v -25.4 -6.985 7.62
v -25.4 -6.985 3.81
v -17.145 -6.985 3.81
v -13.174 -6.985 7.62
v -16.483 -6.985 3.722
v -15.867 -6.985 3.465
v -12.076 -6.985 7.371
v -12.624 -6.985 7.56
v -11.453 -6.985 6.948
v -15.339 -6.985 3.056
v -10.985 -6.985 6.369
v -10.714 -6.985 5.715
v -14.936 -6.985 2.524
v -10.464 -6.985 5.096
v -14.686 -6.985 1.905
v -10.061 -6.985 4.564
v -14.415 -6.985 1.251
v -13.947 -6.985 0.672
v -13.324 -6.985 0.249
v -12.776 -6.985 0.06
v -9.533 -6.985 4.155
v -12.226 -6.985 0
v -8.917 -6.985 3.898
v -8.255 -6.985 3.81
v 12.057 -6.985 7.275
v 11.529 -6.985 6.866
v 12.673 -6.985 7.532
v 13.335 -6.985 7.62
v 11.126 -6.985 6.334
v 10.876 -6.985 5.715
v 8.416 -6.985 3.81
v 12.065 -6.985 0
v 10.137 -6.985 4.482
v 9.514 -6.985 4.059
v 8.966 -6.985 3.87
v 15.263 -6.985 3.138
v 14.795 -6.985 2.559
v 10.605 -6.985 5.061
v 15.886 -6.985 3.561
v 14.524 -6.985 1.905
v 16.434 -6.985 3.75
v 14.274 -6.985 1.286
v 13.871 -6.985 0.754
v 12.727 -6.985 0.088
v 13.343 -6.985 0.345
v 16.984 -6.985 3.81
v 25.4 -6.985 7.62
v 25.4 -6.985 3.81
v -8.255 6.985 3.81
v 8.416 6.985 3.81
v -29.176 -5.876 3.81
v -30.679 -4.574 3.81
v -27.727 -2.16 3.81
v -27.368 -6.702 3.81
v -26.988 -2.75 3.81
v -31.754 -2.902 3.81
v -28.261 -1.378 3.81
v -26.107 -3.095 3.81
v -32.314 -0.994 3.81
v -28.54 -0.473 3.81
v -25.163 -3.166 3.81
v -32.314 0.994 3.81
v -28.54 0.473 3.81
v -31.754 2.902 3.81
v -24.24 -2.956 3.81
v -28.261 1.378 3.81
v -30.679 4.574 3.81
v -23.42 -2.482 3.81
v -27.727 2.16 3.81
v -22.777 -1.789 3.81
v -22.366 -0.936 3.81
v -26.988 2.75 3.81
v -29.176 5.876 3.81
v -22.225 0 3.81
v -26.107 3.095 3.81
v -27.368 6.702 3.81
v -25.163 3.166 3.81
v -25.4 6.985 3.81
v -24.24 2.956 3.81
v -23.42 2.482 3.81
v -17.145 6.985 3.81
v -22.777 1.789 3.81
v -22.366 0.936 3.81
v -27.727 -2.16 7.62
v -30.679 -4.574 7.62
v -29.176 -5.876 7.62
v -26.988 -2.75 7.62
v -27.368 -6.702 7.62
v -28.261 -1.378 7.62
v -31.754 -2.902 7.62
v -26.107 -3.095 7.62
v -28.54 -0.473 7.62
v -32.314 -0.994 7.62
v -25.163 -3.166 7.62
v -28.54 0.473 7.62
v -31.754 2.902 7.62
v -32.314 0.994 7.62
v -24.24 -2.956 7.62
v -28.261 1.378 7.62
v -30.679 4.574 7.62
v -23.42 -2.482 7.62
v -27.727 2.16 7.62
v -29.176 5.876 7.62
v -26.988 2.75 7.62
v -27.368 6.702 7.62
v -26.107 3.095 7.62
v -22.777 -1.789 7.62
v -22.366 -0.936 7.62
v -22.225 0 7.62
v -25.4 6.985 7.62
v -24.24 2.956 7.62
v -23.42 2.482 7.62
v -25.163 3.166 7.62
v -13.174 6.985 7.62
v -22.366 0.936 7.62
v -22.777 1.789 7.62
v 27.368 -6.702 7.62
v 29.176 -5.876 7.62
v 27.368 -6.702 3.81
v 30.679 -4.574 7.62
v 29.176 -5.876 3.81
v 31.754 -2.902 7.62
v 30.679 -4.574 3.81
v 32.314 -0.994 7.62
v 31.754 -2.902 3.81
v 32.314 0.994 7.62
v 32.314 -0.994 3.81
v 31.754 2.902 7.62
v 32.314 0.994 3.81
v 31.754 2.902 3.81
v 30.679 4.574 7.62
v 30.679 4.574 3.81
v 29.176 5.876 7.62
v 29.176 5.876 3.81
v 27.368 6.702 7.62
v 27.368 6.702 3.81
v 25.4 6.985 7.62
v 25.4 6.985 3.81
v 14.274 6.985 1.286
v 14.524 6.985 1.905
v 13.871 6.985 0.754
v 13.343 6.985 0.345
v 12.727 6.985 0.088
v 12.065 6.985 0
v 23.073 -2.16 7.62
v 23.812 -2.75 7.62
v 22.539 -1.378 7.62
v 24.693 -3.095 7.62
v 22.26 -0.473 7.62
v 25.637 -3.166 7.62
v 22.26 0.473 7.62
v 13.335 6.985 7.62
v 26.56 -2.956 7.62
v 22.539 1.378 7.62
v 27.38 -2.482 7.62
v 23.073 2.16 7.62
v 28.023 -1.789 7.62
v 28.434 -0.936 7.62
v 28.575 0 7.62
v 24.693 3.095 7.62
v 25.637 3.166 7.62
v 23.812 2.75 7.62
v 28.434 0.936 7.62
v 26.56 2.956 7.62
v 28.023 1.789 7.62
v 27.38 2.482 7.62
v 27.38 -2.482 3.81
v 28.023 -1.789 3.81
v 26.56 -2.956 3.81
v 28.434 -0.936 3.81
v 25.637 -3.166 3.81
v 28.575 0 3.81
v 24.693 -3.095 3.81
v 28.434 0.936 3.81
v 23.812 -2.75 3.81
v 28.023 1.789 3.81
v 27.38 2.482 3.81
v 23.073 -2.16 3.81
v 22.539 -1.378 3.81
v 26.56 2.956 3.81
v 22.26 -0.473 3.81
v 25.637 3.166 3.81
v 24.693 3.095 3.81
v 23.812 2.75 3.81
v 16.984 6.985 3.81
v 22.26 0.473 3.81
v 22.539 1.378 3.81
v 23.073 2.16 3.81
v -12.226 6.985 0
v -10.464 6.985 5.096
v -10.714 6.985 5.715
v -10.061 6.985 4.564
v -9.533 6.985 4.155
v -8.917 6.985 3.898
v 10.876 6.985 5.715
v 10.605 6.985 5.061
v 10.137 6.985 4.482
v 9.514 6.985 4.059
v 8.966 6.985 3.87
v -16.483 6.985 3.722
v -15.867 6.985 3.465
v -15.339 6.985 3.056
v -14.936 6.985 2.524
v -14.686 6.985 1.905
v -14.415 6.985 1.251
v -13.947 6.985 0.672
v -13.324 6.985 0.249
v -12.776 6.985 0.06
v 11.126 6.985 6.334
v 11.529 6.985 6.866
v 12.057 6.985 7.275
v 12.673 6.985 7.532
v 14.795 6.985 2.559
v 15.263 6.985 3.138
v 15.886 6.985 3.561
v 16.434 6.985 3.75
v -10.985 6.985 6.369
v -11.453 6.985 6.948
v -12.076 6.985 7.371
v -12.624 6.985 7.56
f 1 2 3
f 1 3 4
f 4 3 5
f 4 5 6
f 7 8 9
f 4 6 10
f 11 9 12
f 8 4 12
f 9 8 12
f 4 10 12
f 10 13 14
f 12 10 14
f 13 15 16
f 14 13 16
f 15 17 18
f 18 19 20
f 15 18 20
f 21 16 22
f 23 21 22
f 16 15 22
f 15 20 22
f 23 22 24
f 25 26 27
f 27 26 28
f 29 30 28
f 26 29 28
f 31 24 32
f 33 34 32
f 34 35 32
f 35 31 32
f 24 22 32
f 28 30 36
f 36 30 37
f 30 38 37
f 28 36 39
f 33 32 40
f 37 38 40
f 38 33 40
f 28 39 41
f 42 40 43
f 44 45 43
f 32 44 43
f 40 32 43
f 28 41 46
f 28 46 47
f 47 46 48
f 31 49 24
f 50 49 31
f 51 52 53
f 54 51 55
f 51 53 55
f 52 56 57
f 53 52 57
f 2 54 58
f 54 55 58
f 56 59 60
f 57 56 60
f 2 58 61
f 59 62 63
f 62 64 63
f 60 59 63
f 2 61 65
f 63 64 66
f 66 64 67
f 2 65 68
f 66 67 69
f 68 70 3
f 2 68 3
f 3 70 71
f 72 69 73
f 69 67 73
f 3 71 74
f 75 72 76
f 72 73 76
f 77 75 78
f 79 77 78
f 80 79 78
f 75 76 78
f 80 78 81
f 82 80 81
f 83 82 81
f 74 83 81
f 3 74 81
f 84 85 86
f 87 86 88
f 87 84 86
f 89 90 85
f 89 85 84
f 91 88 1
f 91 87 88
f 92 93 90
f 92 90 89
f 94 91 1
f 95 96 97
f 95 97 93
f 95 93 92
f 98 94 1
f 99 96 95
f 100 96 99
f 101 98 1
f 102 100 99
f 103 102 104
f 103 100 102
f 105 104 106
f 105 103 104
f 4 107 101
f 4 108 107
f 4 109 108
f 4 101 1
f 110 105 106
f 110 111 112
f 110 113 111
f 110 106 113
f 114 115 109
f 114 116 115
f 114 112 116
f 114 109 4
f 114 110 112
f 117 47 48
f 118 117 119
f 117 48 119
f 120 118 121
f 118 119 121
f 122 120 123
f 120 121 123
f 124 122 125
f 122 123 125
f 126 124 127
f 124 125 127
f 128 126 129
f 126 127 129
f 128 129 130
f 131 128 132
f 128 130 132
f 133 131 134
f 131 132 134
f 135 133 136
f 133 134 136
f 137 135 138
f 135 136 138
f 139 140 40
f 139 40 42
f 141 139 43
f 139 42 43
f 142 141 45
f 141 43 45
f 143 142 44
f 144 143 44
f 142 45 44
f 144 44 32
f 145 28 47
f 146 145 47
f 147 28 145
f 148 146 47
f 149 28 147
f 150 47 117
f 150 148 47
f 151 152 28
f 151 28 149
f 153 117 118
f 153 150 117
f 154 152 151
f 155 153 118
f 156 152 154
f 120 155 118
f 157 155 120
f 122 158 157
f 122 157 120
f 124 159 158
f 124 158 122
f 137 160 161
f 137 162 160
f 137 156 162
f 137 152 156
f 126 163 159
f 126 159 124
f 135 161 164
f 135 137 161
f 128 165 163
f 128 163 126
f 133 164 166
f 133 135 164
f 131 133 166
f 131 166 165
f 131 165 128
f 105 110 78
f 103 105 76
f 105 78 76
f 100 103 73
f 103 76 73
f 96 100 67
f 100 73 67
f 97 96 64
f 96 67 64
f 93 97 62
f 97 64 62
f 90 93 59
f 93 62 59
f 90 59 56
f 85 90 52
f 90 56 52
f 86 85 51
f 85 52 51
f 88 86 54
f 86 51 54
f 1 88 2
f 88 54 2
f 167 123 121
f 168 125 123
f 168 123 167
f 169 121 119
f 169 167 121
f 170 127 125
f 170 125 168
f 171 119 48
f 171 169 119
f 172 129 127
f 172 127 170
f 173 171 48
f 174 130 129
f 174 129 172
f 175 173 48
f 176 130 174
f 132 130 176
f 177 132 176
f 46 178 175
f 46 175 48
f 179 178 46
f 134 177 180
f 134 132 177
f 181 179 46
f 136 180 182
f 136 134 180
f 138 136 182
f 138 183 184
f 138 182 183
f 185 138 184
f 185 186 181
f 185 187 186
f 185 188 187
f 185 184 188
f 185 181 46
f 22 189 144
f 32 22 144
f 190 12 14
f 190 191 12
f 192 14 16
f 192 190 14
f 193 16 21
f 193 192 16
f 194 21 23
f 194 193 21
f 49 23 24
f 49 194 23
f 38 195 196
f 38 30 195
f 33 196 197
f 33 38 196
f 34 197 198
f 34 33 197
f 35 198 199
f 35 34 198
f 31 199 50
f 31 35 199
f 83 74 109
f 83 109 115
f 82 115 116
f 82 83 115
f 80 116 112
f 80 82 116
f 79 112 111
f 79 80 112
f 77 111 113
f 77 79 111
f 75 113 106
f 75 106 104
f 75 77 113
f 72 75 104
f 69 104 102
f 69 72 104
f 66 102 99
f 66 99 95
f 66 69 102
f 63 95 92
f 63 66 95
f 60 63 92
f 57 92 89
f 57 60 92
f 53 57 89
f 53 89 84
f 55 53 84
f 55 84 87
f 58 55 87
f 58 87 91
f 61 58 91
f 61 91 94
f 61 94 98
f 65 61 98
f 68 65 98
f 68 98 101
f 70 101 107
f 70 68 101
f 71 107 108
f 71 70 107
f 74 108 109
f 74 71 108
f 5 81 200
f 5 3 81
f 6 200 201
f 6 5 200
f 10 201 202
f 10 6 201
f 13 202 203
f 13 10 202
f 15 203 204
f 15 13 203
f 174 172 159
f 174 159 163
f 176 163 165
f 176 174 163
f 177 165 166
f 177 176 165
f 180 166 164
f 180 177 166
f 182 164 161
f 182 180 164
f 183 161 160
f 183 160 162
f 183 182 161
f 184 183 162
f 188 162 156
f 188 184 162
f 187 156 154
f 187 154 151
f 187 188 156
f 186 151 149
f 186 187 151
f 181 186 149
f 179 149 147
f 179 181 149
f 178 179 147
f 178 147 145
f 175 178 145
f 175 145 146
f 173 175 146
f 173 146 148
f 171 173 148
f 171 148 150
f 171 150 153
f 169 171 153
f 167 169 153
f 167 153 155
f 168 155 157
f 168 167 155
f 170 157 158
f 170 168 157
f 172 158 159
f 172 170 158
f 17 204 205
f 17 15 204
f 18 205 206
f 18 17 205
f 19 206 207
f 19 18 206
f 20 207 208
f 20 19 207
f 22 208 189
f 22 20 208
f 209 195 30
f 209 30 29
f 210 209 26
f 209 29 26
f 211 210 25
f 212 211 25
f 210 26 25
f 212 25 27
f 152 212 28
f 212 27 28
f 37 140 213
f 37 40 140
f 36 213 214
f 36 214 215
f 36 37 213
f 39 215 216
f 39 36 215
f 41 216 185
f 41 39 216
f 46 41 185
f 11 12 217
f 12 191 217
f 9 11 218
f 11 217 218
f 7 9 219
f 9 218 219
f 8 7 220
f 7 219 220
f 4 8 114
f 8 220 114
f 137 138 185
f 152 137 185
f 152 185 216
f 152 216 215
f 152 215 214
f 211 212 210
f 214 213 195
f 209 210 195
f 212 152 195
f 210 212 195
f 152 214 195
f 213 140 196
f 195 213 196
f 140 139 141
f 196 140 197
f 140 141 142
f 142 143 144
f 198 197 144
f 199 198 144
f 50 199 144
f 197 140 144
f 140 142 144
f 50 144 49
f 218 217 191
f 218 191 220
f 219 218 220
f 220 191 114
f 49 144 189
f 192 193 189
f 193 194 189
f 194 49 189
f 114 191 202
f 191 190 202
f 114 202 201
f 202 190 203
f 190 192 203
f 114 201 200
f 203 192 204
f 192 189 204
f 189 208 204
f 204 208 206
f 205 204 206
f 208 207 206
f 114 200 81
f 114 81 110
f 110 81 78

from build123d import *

# Parameters (mm, degrees)
F0_R      = 3.175
F1_DEPTH  = 3.81
F2_R      = 3.175
F3_DEPTH  = 3.81
F4_W      = 35.3329224761
F4_H      = 3.81
F4_W_2    = 10.795
F5_DEPTH  = 38.1
F6_R      = 2.54
F7_R      = 2.54
F8_R      = 3.175
F9_DEPTH  = 3.81
F10_W     = 19.05
F10_H     = 3.81
F11_DEPTH = 38.1
F12_R     = 2.54
F13_R     = 2.54


with BuildPart() as f1:
    # F0 (on Top) → F1 (new body)
    with BuildSketch(Plane.XY):
        with BuildLine():
            ThreePointArc((25.4, -6.985), (32.385, 0), (25.4, 6.985))
            Line((25.4, 6.985), (-25.4, 6.985))
            ThreePointArc((-25.4, 6.985), (-32.385, 0), (-25.4, -6.985))
            Line((-25.4, -6.985), (25.4, -6.985))
        make_face()
        with Locations((-25.4, 0)):
            Circle(F0_R, mode=Mode.SUBTRACT)
        with Locations((25.4, 0)):
            Circle(F0_R, mode=Mode.SUBTRACT)
    extrude(amount=F1_DEPTH)

    # F2 (on face) → F3 (join)
    with BuildSketch(Plane.XY.offset(3.81)):
        with BuildLine():
            Line((-10.795, -6.985), (-10.795, 6.985))
            Line((-10.795, 6.985), (-25.4, 6.985))
            ThreePointArc((-25.4, 6.985), (-32.385, 0), (-25.4, -6.985))
            Line((-25.4, -6.985), (-10.795, -6.985))
        make_face()
        with Locations((-25.4, 0)):
            Circle(F2_R, mode=Mode.SUBTRACT)
    extrude(amount=F3_DEPTH)

    # F4 (on face) → F5 (cut)
    with BuildSketch(Plane(origin=(0, 6.985, 0), x_dir=(-1, 0, 0), z_dir=(0, 1, 0))):
        with Locations((43.066461238, 1.905)):
            Rectangle(F4_W, F4_H)
        with Locations((20.0025, 1.905)):
            Rectangle(F4_W_2, F4_H)
    extrude(amount=-F5_DEPTH, mode=Mode.SUBTRACT)

    # F6
    f6_edges = [f1.edges().sort_by_distance(p)[0] for p in [
        (-10.795, 0, 3.81),
        (-14.605, 0, 3.81),
    ]]
    fillet(f6_edges, radius=F6_R)

    # F7
    f7_edges = [f1.edges().sort_by_distance(p)[0] for p in [
        (-10.795, 0, 7.62),
        (-14.605, 0, 0),
    ]]
    fillet(f7_edges, radius=F7_R)

    # F8 (on face) → F9 (join)
    with BuildSketch(Plane.XY.offset(3.81)):
        with BuildLine():
            Line((25.4, 6.985), (10.795, 6.985))
            Line((10.795, 6.985), (10.795, -6.985))
            Line((10.795, -6.985), (25.4, -6.985))
            ThreePointArc((25.4, -6.985), (32.385, 0), (25.4, 6.985))
        make_face()
        with Locations((25.4, 0)):
            Circle(F8_R, mode=Mode.SUBTRACT)
    extrude(amount=F9_DEPTH)

    # F10 (on face) → F11 (cut)
    with BuildSketch(Plane(origin=(0, 6.985, 0), x_dir=(-1, 0, 0), z_dir=(0, 1, 0))):
        with Locations((-24.13, 1.905)):
            Rectangle(F10_W, F10_H)
    extrude(amount=-F11_DEPTH, mode=Mode.SUBTRACT)

    # F12
    f12_edges = [f1.edges().sort_by_distance(p)[0] for p in [
        (14.605, 0, 0),
        (10.795, 0, 7.62),
    ]]
    fillet(f12_edges, radius=F12_R)

    # F13
    f13_edges = [f1.edges().sort_by_distance(p)[0] for p in [
        (10.795, 0, 3.81),
        (14.605, 0, 3.81),
    ]]
    fillet(f13_edges, radius=F13_R)


solid = f1.part
